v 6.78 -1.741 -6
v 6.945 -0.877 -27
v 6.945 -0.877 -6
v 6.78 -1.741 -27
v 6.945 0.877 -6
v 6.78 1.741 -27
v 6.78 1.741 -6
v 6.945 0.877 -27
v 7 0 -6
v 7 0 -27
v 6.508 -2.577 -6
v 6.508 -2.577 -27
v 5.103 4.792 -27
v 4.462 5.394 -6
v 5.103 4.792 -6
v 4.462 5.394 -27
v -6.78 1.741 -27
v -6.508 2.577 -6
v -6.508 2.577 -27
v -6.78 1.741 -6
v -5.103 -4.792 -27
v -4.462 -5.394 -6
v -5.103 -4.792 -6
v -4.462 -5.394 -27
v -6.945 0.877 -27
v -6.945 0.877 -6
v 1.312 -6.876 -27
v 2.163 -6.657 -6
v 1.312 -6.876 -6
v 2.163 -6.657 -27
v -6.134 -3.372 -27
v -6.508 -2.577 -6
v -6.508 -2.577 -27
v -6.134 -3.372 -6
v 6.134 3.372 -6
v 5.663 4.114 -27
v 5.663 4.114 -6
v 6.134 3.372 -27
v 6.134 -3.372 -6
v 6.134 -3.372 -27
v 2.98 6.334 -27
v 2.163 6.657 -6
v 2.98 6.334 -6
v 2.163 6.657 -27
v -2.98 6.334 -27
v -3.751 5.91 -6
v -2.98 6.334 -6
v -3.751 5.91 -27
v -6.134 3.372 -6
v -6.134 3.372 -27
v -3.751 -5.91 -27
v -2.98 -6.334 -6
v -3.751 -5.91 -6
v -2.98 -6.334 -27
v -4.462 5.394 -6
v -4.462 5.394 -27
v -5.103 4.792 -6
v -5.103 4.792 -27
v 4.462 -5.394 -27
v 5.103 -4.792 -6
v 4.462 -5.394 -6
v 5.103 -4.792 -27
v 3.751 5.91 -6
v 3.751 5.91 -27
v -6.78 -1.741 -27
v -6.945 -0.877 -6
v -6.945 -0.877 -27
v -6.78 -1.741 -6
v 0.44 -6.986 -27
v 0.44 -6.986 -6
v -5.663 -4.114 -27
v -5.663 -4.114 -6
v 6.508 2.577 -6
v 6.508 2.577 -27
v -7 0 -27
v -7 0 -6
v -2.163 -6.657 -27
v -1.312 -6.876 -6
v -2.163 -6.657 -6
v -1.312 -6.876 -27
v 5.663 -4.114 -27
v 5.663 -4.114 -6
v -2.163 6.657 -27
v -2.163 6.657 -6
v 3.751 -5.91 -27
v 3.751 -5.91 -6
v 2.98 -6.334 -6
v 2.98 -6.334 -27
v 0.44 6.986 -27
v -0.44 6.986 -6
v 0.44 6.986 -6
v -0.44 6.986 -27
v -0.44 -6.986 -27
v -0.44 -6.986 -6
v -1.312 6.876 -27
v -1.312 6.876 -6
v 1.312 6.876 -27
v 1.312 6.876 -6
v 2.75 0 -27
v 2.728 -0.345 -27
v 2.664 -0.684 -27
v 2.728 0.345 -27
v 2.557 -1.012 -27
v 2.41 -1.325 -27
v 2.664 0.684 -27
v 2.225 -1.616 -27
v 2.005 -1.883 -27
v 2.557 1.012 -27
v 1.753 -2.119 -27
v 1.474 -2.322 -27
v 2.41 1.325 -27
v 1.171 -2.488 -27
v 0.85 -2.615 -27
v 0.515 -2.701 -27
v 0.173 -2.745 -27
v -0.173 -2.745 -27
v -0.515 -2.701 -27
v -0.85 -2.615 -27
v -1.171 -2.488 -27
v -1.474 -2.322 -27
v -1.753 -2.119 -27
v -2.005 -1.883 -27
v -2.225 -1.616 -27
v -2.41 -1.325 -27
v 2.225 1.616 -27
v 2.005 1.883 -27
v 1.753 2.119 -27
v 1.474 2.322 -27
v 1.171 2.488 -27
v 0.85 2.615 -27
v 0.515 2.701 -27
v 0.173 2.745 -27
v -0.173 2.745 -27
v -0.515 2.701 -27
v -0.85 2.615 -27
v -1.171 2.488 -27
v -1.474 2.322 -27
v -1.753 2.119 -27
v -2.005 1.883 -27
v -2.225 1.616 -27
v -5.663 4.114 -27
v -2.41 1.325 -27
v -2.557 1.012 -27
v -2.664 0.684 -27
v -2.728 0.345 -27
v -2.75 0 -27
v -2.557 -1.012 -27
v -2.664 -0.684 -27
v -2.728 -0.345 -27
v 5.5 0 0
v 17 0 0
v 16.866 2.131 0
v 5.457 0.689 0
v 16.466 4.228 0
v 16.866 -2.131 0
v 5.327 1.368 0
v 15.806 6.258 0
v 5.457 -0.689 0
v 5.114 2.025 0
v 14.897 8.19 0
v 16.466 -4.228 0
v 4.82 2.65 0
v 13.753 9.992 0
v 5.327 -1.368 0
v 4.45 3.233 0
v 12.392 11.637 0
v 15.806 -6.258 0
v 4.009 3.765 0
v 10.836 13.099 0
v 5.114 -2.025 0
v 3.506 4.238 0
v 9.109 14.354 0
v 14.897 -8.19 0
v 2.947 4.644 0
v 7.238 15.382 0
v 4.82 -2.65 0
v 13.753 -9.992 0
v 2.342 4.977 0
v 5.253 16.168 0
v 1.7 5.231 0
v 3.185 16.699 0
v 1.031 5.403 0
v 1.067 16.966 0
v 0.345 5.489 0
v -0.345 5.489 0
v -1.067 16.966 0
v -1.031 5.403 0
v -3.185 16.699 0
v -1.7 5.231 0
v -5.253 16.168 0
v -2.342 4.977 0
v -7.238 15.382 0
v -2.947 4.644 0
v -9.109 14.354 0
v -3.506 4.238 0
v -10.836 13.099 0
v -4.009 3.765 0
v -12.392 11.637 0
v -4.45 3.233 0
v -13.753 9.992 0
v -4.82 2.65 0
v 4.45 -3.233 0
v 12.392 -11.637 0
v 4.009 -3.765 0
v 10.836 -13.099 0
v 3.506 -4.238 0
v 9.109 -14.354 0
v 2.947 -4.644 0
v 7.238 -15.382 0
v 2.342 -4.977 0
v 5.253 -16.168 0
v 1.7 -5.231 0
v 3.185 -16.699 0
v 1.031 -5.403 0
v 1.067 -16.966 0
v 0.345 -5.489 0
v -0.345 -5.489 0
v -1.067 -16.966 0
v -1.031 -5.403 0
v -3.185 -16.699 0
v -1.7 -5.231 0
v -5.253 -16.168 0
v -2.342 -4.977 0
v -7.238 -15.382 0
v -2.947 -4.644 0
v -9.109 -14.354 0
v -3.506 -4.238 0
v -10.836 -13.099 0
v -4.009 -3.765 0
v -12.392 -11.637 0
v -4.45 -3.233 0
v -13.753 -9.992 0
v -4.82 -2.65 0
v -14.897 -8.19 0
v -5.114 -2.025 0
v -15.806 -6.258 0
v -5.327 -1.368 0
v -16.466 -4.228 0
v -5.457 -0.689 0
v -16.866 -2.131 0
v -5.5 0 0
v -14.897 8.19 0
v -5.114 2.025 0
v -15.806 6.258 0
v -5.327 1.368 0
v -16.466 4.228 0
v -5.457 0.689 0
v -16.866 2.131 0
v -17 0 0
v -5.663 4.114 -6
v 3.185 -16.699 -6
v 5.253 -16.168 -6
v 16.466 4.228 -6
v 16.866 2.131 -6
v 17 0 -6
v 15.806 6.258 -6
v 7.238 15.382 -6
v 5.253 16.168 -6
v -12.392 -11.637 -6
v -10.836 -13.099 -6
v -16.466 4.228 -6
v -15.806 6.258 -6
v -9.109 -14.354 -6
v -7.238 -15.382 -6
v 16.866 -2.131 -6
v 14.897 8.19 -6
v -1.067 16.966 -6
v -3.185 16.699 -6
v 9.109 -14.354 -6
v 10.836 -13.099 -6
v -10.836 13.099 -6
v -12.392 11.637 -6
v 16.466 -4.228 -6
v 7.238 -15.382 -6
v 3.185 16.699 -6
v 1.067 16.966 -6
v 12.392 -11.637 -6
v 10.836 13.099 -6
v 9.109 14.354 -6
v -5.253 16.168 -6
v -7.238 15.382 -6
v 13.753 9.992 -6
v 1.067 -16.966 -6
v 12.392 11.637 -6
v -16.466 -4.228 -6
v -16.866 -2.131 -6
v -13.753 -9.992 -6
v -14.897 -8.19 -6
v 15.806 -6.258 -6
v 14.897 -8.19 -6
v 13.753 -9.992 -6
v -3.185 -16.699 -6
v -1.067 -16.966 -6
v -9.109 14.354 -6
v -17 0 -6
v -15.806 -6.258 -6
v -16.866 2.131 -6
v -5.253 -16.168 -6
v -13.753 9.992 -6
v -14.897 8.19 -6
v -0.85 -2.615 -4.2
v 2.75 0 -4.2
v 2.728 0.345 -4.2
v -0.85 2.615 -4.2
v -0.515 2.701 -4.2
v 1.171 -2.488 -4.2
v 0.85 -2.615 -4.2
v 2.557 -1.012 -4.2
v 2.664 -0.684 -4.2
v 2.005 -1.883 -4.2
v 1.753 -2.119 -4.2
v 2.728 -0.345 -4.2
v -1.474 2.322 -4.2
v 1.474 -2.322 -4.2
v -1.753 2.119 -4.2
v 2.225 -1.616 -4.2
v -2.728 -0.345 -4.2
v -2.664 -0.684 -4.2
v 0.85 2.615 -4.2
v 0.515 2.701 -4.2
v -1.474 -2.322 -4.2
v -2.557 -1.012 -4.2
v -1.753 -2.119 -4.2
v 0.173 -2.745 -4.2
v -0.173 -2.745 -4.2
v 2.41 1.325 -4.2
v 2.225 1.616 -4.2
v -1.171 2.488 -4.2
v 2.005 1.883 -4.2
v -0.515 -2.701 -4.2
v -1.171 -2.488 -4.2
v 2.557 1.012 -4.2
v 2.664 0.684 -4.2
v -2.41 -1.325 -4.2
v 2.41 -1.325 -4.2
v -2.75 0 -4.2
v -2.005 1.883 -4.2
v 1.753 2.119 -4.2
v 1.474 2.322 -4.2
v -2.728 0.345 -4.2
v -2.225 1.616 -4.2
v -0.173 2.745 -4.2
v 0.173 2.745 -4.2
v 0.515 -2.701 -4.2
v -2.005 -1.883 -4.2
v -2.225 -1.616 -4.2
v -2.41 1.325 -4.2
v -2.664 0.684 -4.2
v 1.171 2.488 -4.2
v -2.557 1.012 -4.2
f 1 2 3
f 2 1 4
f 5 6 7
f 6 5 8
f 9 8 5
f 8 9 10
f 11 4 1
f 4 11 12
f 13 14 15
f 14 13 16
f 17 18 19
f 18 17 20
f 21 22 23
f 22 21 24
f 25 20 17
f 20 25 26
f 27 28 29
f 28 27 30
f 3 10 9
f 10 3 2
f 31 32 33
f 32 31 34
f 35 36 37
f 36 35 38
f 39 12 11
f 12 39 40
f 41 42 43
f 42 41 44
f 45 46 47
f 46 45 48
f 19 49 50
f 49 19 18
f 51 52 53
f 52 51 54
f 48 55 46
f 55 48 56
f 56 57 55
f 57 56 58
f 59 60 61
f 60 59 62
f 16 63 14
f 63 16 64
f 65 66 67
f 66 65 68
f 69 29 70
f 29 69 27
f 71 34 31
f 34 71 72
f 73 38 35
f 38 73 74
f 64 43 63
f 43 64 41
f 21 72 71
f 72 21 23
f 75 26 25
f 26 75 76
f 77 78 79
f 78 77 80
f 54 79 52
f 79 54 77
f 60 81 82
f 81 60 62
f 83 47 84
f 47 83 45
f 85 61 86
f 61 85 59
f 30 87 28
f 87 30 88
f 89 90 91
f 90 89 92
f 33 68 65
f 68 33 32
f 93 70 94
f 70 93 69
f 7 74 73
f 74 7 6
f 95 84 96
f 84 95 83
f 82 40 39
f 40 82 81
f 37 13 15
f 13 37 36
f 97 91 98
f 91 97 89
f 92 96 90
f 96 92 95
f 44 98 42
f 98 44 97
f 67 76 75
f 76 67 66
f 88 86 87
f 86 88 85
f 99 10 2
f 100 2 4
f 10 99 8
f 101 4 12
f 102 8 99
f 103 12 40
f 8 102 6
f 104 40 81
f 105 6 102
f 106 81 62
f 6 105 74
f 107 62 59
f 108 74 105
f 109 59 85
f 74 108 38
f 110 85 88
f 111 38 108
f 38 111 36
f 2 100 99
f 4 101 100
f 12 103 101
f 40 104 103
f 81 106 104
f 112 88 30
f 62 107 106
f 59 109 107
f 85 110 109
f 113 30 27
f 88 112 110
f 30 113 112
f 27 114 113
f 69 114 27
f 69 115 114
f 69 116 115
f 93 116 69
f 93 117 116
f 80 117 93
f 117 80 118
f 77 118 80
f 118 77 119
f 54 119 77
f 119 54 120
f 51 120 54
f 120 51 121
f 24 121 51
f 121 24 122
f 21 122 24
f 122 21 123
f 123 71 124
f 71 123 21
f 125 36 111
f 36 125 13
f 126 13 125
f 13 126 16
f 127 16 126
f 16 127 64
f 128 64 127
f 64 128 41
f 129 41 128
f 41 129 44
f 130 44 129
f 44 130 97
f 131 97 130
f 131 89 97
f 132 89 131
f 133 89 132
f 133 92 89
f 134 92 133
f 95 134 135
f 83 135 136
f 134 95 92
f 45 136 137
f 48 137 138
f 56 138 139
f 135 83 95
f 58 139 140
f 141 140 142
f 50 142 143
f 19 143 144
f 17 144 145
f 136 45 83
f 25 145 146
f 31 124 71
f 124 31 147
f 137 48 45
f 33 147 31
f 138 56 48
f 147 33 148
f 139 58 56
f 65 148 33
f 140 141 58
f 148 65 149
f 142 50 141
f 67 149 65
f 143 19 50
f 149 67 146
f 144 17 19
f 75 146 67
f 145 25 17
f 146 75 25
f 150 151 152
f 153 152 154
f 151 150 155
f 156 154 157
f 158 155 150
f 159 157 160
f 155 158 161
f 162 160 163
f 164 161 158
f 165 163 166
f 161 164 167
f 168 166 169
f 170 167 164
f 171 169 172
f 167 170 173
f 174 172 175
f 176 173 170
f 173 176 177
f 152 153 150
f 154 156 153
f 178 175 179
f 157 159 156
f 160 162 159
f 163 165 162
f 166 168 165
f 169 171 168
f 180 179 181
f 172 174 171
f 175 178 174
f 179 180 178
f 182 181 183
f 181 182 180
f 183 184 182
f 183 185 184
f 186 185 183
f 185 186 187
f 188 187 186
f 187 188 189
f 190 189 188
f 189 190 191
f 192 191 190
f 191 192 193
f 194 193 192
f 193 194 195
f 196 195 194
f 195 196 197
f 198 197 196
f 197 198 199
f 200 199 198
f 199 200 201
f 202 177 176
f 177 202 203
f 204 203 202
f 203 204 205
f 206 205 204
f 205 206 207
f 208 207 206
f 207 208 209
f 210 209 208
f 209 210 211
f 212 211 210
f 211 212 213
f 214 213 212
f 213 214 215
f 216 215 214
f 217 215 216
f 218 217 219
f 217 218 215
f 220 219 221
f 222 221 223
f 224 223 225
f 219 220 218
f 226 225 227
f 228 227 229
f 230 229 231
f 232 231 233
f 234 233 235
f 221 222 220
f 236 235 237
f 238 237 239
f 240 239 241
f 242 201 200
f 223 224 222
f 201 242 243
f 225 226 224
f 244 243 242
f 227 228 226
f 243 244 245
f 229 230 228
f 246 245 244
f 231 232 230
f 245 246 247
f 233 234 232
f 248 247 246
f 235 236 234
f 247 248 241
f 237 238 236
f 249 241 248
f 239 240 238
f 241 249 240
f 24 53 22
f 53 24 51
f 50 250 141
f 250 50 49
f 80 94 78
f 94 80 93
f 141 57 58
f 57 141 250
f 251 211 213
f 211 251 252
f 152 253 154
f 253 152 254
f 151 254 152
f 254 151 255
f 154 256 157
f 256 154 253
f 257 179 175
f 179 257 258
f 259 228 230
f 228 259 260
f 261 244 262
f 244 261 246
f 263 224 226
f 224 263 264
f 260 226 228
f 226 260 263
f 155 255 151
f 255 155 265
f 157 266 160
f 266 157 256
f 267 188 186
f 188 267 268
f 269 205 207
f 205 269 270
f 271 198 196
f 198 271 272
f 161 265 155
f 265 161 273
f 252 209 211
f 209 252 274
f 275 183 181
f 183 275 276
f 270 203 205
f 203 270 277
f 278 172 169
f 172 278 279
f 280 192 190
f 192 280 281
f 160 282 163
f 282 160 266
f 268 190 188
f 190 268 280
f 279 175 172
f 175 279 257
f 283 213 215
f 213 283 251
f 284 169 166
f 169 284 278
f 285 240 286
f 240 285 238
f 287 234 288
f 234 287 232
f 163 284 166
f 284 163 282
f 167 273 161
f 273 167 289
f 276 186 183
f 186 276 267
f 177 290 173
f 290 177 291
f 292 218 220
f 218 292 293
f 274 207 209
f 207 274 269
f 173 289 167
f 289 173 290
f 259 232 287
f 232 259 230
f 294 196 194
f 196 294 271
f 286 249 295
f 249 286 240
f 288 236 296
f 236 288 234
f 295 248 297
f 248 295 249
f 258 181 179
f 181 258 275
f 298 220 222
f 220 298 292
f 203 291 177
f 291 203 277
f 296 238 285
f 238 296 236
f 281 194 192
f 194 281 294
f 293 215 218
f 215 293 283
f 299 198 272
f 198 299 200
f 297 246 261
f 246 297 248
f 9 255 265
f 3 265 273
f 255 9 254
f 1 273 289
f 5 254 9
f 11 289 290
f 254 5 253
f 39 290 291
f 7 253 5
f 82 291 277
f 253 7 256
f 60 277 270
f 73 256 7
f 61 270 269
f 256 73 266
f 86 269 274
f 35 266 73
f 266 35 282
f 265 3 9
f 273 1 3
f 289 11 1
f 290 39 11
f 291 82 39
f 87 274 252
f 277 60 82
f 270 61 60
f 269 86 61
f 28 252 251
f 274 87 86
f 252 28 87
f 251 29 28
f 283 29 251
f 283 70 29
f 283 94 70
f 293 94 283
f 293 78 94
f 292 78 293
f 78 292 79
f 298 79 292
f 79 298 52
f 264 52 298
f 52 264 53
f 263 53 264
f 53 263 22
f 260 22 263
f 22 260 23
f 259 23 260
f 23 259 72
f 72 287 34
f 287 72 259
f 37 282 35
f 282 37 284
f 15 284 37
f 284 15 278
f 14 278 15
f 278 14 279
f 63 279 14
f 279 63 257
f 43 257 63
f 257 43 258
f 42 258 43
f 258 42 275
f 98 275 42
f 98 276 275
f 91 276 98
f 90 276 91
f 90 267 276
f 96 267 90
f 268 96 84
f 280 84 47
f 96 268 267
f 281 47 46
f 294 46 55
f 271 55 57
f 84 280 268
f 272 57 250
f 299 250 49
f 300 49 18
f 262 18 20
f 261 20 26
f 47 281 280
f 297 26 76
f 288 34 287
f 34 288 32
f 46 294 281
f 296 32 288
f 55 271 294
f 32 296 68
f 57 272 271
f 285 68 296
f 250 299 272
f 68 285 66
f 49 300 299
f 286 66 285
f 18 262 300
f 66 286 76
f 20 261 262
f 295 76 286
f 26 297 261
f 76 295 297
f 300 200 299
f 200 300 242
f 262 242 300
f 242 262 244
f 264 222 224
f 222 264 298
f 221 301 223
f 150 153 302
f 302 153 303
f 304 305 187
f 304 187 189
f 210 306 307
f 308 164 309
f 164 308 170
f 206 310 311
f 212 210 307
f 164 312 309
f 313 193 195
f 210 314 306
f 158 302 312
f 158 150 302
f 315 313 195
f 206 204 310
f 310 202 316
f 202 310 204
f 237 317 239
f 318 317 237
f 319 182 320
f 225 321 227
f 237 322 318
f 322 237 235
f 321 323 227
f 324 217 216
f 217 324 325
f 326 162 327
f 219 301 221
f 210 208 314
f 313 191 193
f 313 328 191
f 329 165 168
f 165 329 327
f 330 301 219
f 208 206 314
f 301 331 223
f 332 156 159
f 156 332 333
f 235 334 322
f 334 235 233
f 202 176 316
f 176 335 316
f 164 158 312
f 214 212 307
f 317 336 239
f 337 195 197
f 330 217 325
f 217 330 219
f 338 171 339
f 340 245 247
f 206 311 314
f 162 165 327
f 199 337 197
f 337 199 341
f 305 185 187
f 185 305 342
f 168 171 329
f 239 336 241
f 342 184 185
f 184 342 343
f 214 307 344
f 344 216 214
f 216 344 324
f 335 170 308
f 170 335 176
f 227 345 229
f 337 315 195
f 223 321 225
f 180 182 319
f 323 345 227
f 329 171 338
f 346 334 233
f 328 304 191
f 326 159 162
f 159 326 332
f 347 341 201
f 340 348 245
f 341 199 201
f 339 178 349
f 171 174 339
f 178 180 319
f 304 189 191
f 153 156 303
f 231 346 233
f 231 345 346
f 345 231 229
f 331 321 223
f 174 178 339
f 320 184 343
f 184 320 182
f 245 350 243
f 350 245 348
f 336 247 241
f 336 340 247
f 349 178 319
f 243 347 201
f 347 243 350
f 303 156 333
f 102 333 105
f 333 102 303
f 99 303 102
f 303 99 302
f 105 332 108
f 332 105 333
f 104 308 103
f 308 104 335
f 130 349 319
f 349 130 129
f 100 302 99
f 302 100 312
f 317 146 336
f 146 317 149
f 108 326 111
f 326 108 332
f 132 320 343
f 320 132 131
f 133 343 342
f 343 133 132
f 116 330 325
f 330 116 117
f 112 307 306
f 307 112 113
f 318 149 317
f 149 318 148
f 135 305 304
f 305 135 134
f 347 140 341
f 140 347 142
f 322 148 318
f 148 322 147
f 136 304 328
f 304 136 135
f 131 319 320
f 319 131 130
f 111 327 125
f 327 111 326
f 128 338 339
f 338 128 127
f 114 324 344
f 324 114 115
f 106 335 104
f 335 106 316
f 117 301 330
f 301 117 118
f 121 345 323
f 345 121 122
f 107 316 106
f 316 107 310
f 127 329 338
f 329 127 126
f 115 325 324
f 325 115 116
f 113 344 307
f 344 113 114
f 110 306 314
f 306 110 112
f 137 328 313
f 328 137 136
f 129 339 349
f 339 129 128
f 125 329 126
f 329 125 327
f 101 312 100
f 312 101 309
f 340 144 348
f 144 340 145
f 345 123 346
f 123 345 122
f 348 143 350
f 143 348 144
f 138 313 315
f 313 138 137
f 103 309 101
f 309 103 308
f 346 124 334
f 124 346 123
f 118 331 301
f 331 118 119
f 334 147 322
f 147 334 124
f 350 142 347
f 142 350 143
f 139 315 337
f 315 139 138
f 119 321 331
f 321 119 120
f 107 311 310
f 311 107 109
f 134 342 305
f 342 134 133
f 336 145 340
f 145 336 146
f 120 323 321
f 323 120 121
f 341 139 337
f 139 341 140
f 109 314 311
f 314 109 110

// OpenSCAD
$fn = 50;


difference() {
	union() {
		translate(v = [0, 0, -27.0000000000]) {
			cylinder(h = 27, r = 7.0000000000);
		}
		translate(v = [0, 0, -6.0000000000]) {
			cylinder(h = 6, r = 17.0000000000);
		}
	}
	union() {
		translate(v = [0, 0, 0]) {
			rotate(a = [0, 0, 0]) {
				difference() {
					union() {
						#translate(v = [0, 0, -27.0000000000]) {
							cylinder(h = 27, r = 2.2500000000);
						}
						#translate(v = [0, 0, -4.2000000000]) {
							cylinder(h = 4.2000000000, r1 = 2.7500000000, r2 = 5.5000000000);
						}
						#translate(v = [0, 0, -27.0000000000]) {
							cylinder(h = 27, r = 2.7500000000);
						}
						#translate(v = [0, 0, -27.0000000000]) {
							cylinder(h = 27, r = 2.2500000000);
						}
					}
					union();
				}
			}
		}
	}
}
